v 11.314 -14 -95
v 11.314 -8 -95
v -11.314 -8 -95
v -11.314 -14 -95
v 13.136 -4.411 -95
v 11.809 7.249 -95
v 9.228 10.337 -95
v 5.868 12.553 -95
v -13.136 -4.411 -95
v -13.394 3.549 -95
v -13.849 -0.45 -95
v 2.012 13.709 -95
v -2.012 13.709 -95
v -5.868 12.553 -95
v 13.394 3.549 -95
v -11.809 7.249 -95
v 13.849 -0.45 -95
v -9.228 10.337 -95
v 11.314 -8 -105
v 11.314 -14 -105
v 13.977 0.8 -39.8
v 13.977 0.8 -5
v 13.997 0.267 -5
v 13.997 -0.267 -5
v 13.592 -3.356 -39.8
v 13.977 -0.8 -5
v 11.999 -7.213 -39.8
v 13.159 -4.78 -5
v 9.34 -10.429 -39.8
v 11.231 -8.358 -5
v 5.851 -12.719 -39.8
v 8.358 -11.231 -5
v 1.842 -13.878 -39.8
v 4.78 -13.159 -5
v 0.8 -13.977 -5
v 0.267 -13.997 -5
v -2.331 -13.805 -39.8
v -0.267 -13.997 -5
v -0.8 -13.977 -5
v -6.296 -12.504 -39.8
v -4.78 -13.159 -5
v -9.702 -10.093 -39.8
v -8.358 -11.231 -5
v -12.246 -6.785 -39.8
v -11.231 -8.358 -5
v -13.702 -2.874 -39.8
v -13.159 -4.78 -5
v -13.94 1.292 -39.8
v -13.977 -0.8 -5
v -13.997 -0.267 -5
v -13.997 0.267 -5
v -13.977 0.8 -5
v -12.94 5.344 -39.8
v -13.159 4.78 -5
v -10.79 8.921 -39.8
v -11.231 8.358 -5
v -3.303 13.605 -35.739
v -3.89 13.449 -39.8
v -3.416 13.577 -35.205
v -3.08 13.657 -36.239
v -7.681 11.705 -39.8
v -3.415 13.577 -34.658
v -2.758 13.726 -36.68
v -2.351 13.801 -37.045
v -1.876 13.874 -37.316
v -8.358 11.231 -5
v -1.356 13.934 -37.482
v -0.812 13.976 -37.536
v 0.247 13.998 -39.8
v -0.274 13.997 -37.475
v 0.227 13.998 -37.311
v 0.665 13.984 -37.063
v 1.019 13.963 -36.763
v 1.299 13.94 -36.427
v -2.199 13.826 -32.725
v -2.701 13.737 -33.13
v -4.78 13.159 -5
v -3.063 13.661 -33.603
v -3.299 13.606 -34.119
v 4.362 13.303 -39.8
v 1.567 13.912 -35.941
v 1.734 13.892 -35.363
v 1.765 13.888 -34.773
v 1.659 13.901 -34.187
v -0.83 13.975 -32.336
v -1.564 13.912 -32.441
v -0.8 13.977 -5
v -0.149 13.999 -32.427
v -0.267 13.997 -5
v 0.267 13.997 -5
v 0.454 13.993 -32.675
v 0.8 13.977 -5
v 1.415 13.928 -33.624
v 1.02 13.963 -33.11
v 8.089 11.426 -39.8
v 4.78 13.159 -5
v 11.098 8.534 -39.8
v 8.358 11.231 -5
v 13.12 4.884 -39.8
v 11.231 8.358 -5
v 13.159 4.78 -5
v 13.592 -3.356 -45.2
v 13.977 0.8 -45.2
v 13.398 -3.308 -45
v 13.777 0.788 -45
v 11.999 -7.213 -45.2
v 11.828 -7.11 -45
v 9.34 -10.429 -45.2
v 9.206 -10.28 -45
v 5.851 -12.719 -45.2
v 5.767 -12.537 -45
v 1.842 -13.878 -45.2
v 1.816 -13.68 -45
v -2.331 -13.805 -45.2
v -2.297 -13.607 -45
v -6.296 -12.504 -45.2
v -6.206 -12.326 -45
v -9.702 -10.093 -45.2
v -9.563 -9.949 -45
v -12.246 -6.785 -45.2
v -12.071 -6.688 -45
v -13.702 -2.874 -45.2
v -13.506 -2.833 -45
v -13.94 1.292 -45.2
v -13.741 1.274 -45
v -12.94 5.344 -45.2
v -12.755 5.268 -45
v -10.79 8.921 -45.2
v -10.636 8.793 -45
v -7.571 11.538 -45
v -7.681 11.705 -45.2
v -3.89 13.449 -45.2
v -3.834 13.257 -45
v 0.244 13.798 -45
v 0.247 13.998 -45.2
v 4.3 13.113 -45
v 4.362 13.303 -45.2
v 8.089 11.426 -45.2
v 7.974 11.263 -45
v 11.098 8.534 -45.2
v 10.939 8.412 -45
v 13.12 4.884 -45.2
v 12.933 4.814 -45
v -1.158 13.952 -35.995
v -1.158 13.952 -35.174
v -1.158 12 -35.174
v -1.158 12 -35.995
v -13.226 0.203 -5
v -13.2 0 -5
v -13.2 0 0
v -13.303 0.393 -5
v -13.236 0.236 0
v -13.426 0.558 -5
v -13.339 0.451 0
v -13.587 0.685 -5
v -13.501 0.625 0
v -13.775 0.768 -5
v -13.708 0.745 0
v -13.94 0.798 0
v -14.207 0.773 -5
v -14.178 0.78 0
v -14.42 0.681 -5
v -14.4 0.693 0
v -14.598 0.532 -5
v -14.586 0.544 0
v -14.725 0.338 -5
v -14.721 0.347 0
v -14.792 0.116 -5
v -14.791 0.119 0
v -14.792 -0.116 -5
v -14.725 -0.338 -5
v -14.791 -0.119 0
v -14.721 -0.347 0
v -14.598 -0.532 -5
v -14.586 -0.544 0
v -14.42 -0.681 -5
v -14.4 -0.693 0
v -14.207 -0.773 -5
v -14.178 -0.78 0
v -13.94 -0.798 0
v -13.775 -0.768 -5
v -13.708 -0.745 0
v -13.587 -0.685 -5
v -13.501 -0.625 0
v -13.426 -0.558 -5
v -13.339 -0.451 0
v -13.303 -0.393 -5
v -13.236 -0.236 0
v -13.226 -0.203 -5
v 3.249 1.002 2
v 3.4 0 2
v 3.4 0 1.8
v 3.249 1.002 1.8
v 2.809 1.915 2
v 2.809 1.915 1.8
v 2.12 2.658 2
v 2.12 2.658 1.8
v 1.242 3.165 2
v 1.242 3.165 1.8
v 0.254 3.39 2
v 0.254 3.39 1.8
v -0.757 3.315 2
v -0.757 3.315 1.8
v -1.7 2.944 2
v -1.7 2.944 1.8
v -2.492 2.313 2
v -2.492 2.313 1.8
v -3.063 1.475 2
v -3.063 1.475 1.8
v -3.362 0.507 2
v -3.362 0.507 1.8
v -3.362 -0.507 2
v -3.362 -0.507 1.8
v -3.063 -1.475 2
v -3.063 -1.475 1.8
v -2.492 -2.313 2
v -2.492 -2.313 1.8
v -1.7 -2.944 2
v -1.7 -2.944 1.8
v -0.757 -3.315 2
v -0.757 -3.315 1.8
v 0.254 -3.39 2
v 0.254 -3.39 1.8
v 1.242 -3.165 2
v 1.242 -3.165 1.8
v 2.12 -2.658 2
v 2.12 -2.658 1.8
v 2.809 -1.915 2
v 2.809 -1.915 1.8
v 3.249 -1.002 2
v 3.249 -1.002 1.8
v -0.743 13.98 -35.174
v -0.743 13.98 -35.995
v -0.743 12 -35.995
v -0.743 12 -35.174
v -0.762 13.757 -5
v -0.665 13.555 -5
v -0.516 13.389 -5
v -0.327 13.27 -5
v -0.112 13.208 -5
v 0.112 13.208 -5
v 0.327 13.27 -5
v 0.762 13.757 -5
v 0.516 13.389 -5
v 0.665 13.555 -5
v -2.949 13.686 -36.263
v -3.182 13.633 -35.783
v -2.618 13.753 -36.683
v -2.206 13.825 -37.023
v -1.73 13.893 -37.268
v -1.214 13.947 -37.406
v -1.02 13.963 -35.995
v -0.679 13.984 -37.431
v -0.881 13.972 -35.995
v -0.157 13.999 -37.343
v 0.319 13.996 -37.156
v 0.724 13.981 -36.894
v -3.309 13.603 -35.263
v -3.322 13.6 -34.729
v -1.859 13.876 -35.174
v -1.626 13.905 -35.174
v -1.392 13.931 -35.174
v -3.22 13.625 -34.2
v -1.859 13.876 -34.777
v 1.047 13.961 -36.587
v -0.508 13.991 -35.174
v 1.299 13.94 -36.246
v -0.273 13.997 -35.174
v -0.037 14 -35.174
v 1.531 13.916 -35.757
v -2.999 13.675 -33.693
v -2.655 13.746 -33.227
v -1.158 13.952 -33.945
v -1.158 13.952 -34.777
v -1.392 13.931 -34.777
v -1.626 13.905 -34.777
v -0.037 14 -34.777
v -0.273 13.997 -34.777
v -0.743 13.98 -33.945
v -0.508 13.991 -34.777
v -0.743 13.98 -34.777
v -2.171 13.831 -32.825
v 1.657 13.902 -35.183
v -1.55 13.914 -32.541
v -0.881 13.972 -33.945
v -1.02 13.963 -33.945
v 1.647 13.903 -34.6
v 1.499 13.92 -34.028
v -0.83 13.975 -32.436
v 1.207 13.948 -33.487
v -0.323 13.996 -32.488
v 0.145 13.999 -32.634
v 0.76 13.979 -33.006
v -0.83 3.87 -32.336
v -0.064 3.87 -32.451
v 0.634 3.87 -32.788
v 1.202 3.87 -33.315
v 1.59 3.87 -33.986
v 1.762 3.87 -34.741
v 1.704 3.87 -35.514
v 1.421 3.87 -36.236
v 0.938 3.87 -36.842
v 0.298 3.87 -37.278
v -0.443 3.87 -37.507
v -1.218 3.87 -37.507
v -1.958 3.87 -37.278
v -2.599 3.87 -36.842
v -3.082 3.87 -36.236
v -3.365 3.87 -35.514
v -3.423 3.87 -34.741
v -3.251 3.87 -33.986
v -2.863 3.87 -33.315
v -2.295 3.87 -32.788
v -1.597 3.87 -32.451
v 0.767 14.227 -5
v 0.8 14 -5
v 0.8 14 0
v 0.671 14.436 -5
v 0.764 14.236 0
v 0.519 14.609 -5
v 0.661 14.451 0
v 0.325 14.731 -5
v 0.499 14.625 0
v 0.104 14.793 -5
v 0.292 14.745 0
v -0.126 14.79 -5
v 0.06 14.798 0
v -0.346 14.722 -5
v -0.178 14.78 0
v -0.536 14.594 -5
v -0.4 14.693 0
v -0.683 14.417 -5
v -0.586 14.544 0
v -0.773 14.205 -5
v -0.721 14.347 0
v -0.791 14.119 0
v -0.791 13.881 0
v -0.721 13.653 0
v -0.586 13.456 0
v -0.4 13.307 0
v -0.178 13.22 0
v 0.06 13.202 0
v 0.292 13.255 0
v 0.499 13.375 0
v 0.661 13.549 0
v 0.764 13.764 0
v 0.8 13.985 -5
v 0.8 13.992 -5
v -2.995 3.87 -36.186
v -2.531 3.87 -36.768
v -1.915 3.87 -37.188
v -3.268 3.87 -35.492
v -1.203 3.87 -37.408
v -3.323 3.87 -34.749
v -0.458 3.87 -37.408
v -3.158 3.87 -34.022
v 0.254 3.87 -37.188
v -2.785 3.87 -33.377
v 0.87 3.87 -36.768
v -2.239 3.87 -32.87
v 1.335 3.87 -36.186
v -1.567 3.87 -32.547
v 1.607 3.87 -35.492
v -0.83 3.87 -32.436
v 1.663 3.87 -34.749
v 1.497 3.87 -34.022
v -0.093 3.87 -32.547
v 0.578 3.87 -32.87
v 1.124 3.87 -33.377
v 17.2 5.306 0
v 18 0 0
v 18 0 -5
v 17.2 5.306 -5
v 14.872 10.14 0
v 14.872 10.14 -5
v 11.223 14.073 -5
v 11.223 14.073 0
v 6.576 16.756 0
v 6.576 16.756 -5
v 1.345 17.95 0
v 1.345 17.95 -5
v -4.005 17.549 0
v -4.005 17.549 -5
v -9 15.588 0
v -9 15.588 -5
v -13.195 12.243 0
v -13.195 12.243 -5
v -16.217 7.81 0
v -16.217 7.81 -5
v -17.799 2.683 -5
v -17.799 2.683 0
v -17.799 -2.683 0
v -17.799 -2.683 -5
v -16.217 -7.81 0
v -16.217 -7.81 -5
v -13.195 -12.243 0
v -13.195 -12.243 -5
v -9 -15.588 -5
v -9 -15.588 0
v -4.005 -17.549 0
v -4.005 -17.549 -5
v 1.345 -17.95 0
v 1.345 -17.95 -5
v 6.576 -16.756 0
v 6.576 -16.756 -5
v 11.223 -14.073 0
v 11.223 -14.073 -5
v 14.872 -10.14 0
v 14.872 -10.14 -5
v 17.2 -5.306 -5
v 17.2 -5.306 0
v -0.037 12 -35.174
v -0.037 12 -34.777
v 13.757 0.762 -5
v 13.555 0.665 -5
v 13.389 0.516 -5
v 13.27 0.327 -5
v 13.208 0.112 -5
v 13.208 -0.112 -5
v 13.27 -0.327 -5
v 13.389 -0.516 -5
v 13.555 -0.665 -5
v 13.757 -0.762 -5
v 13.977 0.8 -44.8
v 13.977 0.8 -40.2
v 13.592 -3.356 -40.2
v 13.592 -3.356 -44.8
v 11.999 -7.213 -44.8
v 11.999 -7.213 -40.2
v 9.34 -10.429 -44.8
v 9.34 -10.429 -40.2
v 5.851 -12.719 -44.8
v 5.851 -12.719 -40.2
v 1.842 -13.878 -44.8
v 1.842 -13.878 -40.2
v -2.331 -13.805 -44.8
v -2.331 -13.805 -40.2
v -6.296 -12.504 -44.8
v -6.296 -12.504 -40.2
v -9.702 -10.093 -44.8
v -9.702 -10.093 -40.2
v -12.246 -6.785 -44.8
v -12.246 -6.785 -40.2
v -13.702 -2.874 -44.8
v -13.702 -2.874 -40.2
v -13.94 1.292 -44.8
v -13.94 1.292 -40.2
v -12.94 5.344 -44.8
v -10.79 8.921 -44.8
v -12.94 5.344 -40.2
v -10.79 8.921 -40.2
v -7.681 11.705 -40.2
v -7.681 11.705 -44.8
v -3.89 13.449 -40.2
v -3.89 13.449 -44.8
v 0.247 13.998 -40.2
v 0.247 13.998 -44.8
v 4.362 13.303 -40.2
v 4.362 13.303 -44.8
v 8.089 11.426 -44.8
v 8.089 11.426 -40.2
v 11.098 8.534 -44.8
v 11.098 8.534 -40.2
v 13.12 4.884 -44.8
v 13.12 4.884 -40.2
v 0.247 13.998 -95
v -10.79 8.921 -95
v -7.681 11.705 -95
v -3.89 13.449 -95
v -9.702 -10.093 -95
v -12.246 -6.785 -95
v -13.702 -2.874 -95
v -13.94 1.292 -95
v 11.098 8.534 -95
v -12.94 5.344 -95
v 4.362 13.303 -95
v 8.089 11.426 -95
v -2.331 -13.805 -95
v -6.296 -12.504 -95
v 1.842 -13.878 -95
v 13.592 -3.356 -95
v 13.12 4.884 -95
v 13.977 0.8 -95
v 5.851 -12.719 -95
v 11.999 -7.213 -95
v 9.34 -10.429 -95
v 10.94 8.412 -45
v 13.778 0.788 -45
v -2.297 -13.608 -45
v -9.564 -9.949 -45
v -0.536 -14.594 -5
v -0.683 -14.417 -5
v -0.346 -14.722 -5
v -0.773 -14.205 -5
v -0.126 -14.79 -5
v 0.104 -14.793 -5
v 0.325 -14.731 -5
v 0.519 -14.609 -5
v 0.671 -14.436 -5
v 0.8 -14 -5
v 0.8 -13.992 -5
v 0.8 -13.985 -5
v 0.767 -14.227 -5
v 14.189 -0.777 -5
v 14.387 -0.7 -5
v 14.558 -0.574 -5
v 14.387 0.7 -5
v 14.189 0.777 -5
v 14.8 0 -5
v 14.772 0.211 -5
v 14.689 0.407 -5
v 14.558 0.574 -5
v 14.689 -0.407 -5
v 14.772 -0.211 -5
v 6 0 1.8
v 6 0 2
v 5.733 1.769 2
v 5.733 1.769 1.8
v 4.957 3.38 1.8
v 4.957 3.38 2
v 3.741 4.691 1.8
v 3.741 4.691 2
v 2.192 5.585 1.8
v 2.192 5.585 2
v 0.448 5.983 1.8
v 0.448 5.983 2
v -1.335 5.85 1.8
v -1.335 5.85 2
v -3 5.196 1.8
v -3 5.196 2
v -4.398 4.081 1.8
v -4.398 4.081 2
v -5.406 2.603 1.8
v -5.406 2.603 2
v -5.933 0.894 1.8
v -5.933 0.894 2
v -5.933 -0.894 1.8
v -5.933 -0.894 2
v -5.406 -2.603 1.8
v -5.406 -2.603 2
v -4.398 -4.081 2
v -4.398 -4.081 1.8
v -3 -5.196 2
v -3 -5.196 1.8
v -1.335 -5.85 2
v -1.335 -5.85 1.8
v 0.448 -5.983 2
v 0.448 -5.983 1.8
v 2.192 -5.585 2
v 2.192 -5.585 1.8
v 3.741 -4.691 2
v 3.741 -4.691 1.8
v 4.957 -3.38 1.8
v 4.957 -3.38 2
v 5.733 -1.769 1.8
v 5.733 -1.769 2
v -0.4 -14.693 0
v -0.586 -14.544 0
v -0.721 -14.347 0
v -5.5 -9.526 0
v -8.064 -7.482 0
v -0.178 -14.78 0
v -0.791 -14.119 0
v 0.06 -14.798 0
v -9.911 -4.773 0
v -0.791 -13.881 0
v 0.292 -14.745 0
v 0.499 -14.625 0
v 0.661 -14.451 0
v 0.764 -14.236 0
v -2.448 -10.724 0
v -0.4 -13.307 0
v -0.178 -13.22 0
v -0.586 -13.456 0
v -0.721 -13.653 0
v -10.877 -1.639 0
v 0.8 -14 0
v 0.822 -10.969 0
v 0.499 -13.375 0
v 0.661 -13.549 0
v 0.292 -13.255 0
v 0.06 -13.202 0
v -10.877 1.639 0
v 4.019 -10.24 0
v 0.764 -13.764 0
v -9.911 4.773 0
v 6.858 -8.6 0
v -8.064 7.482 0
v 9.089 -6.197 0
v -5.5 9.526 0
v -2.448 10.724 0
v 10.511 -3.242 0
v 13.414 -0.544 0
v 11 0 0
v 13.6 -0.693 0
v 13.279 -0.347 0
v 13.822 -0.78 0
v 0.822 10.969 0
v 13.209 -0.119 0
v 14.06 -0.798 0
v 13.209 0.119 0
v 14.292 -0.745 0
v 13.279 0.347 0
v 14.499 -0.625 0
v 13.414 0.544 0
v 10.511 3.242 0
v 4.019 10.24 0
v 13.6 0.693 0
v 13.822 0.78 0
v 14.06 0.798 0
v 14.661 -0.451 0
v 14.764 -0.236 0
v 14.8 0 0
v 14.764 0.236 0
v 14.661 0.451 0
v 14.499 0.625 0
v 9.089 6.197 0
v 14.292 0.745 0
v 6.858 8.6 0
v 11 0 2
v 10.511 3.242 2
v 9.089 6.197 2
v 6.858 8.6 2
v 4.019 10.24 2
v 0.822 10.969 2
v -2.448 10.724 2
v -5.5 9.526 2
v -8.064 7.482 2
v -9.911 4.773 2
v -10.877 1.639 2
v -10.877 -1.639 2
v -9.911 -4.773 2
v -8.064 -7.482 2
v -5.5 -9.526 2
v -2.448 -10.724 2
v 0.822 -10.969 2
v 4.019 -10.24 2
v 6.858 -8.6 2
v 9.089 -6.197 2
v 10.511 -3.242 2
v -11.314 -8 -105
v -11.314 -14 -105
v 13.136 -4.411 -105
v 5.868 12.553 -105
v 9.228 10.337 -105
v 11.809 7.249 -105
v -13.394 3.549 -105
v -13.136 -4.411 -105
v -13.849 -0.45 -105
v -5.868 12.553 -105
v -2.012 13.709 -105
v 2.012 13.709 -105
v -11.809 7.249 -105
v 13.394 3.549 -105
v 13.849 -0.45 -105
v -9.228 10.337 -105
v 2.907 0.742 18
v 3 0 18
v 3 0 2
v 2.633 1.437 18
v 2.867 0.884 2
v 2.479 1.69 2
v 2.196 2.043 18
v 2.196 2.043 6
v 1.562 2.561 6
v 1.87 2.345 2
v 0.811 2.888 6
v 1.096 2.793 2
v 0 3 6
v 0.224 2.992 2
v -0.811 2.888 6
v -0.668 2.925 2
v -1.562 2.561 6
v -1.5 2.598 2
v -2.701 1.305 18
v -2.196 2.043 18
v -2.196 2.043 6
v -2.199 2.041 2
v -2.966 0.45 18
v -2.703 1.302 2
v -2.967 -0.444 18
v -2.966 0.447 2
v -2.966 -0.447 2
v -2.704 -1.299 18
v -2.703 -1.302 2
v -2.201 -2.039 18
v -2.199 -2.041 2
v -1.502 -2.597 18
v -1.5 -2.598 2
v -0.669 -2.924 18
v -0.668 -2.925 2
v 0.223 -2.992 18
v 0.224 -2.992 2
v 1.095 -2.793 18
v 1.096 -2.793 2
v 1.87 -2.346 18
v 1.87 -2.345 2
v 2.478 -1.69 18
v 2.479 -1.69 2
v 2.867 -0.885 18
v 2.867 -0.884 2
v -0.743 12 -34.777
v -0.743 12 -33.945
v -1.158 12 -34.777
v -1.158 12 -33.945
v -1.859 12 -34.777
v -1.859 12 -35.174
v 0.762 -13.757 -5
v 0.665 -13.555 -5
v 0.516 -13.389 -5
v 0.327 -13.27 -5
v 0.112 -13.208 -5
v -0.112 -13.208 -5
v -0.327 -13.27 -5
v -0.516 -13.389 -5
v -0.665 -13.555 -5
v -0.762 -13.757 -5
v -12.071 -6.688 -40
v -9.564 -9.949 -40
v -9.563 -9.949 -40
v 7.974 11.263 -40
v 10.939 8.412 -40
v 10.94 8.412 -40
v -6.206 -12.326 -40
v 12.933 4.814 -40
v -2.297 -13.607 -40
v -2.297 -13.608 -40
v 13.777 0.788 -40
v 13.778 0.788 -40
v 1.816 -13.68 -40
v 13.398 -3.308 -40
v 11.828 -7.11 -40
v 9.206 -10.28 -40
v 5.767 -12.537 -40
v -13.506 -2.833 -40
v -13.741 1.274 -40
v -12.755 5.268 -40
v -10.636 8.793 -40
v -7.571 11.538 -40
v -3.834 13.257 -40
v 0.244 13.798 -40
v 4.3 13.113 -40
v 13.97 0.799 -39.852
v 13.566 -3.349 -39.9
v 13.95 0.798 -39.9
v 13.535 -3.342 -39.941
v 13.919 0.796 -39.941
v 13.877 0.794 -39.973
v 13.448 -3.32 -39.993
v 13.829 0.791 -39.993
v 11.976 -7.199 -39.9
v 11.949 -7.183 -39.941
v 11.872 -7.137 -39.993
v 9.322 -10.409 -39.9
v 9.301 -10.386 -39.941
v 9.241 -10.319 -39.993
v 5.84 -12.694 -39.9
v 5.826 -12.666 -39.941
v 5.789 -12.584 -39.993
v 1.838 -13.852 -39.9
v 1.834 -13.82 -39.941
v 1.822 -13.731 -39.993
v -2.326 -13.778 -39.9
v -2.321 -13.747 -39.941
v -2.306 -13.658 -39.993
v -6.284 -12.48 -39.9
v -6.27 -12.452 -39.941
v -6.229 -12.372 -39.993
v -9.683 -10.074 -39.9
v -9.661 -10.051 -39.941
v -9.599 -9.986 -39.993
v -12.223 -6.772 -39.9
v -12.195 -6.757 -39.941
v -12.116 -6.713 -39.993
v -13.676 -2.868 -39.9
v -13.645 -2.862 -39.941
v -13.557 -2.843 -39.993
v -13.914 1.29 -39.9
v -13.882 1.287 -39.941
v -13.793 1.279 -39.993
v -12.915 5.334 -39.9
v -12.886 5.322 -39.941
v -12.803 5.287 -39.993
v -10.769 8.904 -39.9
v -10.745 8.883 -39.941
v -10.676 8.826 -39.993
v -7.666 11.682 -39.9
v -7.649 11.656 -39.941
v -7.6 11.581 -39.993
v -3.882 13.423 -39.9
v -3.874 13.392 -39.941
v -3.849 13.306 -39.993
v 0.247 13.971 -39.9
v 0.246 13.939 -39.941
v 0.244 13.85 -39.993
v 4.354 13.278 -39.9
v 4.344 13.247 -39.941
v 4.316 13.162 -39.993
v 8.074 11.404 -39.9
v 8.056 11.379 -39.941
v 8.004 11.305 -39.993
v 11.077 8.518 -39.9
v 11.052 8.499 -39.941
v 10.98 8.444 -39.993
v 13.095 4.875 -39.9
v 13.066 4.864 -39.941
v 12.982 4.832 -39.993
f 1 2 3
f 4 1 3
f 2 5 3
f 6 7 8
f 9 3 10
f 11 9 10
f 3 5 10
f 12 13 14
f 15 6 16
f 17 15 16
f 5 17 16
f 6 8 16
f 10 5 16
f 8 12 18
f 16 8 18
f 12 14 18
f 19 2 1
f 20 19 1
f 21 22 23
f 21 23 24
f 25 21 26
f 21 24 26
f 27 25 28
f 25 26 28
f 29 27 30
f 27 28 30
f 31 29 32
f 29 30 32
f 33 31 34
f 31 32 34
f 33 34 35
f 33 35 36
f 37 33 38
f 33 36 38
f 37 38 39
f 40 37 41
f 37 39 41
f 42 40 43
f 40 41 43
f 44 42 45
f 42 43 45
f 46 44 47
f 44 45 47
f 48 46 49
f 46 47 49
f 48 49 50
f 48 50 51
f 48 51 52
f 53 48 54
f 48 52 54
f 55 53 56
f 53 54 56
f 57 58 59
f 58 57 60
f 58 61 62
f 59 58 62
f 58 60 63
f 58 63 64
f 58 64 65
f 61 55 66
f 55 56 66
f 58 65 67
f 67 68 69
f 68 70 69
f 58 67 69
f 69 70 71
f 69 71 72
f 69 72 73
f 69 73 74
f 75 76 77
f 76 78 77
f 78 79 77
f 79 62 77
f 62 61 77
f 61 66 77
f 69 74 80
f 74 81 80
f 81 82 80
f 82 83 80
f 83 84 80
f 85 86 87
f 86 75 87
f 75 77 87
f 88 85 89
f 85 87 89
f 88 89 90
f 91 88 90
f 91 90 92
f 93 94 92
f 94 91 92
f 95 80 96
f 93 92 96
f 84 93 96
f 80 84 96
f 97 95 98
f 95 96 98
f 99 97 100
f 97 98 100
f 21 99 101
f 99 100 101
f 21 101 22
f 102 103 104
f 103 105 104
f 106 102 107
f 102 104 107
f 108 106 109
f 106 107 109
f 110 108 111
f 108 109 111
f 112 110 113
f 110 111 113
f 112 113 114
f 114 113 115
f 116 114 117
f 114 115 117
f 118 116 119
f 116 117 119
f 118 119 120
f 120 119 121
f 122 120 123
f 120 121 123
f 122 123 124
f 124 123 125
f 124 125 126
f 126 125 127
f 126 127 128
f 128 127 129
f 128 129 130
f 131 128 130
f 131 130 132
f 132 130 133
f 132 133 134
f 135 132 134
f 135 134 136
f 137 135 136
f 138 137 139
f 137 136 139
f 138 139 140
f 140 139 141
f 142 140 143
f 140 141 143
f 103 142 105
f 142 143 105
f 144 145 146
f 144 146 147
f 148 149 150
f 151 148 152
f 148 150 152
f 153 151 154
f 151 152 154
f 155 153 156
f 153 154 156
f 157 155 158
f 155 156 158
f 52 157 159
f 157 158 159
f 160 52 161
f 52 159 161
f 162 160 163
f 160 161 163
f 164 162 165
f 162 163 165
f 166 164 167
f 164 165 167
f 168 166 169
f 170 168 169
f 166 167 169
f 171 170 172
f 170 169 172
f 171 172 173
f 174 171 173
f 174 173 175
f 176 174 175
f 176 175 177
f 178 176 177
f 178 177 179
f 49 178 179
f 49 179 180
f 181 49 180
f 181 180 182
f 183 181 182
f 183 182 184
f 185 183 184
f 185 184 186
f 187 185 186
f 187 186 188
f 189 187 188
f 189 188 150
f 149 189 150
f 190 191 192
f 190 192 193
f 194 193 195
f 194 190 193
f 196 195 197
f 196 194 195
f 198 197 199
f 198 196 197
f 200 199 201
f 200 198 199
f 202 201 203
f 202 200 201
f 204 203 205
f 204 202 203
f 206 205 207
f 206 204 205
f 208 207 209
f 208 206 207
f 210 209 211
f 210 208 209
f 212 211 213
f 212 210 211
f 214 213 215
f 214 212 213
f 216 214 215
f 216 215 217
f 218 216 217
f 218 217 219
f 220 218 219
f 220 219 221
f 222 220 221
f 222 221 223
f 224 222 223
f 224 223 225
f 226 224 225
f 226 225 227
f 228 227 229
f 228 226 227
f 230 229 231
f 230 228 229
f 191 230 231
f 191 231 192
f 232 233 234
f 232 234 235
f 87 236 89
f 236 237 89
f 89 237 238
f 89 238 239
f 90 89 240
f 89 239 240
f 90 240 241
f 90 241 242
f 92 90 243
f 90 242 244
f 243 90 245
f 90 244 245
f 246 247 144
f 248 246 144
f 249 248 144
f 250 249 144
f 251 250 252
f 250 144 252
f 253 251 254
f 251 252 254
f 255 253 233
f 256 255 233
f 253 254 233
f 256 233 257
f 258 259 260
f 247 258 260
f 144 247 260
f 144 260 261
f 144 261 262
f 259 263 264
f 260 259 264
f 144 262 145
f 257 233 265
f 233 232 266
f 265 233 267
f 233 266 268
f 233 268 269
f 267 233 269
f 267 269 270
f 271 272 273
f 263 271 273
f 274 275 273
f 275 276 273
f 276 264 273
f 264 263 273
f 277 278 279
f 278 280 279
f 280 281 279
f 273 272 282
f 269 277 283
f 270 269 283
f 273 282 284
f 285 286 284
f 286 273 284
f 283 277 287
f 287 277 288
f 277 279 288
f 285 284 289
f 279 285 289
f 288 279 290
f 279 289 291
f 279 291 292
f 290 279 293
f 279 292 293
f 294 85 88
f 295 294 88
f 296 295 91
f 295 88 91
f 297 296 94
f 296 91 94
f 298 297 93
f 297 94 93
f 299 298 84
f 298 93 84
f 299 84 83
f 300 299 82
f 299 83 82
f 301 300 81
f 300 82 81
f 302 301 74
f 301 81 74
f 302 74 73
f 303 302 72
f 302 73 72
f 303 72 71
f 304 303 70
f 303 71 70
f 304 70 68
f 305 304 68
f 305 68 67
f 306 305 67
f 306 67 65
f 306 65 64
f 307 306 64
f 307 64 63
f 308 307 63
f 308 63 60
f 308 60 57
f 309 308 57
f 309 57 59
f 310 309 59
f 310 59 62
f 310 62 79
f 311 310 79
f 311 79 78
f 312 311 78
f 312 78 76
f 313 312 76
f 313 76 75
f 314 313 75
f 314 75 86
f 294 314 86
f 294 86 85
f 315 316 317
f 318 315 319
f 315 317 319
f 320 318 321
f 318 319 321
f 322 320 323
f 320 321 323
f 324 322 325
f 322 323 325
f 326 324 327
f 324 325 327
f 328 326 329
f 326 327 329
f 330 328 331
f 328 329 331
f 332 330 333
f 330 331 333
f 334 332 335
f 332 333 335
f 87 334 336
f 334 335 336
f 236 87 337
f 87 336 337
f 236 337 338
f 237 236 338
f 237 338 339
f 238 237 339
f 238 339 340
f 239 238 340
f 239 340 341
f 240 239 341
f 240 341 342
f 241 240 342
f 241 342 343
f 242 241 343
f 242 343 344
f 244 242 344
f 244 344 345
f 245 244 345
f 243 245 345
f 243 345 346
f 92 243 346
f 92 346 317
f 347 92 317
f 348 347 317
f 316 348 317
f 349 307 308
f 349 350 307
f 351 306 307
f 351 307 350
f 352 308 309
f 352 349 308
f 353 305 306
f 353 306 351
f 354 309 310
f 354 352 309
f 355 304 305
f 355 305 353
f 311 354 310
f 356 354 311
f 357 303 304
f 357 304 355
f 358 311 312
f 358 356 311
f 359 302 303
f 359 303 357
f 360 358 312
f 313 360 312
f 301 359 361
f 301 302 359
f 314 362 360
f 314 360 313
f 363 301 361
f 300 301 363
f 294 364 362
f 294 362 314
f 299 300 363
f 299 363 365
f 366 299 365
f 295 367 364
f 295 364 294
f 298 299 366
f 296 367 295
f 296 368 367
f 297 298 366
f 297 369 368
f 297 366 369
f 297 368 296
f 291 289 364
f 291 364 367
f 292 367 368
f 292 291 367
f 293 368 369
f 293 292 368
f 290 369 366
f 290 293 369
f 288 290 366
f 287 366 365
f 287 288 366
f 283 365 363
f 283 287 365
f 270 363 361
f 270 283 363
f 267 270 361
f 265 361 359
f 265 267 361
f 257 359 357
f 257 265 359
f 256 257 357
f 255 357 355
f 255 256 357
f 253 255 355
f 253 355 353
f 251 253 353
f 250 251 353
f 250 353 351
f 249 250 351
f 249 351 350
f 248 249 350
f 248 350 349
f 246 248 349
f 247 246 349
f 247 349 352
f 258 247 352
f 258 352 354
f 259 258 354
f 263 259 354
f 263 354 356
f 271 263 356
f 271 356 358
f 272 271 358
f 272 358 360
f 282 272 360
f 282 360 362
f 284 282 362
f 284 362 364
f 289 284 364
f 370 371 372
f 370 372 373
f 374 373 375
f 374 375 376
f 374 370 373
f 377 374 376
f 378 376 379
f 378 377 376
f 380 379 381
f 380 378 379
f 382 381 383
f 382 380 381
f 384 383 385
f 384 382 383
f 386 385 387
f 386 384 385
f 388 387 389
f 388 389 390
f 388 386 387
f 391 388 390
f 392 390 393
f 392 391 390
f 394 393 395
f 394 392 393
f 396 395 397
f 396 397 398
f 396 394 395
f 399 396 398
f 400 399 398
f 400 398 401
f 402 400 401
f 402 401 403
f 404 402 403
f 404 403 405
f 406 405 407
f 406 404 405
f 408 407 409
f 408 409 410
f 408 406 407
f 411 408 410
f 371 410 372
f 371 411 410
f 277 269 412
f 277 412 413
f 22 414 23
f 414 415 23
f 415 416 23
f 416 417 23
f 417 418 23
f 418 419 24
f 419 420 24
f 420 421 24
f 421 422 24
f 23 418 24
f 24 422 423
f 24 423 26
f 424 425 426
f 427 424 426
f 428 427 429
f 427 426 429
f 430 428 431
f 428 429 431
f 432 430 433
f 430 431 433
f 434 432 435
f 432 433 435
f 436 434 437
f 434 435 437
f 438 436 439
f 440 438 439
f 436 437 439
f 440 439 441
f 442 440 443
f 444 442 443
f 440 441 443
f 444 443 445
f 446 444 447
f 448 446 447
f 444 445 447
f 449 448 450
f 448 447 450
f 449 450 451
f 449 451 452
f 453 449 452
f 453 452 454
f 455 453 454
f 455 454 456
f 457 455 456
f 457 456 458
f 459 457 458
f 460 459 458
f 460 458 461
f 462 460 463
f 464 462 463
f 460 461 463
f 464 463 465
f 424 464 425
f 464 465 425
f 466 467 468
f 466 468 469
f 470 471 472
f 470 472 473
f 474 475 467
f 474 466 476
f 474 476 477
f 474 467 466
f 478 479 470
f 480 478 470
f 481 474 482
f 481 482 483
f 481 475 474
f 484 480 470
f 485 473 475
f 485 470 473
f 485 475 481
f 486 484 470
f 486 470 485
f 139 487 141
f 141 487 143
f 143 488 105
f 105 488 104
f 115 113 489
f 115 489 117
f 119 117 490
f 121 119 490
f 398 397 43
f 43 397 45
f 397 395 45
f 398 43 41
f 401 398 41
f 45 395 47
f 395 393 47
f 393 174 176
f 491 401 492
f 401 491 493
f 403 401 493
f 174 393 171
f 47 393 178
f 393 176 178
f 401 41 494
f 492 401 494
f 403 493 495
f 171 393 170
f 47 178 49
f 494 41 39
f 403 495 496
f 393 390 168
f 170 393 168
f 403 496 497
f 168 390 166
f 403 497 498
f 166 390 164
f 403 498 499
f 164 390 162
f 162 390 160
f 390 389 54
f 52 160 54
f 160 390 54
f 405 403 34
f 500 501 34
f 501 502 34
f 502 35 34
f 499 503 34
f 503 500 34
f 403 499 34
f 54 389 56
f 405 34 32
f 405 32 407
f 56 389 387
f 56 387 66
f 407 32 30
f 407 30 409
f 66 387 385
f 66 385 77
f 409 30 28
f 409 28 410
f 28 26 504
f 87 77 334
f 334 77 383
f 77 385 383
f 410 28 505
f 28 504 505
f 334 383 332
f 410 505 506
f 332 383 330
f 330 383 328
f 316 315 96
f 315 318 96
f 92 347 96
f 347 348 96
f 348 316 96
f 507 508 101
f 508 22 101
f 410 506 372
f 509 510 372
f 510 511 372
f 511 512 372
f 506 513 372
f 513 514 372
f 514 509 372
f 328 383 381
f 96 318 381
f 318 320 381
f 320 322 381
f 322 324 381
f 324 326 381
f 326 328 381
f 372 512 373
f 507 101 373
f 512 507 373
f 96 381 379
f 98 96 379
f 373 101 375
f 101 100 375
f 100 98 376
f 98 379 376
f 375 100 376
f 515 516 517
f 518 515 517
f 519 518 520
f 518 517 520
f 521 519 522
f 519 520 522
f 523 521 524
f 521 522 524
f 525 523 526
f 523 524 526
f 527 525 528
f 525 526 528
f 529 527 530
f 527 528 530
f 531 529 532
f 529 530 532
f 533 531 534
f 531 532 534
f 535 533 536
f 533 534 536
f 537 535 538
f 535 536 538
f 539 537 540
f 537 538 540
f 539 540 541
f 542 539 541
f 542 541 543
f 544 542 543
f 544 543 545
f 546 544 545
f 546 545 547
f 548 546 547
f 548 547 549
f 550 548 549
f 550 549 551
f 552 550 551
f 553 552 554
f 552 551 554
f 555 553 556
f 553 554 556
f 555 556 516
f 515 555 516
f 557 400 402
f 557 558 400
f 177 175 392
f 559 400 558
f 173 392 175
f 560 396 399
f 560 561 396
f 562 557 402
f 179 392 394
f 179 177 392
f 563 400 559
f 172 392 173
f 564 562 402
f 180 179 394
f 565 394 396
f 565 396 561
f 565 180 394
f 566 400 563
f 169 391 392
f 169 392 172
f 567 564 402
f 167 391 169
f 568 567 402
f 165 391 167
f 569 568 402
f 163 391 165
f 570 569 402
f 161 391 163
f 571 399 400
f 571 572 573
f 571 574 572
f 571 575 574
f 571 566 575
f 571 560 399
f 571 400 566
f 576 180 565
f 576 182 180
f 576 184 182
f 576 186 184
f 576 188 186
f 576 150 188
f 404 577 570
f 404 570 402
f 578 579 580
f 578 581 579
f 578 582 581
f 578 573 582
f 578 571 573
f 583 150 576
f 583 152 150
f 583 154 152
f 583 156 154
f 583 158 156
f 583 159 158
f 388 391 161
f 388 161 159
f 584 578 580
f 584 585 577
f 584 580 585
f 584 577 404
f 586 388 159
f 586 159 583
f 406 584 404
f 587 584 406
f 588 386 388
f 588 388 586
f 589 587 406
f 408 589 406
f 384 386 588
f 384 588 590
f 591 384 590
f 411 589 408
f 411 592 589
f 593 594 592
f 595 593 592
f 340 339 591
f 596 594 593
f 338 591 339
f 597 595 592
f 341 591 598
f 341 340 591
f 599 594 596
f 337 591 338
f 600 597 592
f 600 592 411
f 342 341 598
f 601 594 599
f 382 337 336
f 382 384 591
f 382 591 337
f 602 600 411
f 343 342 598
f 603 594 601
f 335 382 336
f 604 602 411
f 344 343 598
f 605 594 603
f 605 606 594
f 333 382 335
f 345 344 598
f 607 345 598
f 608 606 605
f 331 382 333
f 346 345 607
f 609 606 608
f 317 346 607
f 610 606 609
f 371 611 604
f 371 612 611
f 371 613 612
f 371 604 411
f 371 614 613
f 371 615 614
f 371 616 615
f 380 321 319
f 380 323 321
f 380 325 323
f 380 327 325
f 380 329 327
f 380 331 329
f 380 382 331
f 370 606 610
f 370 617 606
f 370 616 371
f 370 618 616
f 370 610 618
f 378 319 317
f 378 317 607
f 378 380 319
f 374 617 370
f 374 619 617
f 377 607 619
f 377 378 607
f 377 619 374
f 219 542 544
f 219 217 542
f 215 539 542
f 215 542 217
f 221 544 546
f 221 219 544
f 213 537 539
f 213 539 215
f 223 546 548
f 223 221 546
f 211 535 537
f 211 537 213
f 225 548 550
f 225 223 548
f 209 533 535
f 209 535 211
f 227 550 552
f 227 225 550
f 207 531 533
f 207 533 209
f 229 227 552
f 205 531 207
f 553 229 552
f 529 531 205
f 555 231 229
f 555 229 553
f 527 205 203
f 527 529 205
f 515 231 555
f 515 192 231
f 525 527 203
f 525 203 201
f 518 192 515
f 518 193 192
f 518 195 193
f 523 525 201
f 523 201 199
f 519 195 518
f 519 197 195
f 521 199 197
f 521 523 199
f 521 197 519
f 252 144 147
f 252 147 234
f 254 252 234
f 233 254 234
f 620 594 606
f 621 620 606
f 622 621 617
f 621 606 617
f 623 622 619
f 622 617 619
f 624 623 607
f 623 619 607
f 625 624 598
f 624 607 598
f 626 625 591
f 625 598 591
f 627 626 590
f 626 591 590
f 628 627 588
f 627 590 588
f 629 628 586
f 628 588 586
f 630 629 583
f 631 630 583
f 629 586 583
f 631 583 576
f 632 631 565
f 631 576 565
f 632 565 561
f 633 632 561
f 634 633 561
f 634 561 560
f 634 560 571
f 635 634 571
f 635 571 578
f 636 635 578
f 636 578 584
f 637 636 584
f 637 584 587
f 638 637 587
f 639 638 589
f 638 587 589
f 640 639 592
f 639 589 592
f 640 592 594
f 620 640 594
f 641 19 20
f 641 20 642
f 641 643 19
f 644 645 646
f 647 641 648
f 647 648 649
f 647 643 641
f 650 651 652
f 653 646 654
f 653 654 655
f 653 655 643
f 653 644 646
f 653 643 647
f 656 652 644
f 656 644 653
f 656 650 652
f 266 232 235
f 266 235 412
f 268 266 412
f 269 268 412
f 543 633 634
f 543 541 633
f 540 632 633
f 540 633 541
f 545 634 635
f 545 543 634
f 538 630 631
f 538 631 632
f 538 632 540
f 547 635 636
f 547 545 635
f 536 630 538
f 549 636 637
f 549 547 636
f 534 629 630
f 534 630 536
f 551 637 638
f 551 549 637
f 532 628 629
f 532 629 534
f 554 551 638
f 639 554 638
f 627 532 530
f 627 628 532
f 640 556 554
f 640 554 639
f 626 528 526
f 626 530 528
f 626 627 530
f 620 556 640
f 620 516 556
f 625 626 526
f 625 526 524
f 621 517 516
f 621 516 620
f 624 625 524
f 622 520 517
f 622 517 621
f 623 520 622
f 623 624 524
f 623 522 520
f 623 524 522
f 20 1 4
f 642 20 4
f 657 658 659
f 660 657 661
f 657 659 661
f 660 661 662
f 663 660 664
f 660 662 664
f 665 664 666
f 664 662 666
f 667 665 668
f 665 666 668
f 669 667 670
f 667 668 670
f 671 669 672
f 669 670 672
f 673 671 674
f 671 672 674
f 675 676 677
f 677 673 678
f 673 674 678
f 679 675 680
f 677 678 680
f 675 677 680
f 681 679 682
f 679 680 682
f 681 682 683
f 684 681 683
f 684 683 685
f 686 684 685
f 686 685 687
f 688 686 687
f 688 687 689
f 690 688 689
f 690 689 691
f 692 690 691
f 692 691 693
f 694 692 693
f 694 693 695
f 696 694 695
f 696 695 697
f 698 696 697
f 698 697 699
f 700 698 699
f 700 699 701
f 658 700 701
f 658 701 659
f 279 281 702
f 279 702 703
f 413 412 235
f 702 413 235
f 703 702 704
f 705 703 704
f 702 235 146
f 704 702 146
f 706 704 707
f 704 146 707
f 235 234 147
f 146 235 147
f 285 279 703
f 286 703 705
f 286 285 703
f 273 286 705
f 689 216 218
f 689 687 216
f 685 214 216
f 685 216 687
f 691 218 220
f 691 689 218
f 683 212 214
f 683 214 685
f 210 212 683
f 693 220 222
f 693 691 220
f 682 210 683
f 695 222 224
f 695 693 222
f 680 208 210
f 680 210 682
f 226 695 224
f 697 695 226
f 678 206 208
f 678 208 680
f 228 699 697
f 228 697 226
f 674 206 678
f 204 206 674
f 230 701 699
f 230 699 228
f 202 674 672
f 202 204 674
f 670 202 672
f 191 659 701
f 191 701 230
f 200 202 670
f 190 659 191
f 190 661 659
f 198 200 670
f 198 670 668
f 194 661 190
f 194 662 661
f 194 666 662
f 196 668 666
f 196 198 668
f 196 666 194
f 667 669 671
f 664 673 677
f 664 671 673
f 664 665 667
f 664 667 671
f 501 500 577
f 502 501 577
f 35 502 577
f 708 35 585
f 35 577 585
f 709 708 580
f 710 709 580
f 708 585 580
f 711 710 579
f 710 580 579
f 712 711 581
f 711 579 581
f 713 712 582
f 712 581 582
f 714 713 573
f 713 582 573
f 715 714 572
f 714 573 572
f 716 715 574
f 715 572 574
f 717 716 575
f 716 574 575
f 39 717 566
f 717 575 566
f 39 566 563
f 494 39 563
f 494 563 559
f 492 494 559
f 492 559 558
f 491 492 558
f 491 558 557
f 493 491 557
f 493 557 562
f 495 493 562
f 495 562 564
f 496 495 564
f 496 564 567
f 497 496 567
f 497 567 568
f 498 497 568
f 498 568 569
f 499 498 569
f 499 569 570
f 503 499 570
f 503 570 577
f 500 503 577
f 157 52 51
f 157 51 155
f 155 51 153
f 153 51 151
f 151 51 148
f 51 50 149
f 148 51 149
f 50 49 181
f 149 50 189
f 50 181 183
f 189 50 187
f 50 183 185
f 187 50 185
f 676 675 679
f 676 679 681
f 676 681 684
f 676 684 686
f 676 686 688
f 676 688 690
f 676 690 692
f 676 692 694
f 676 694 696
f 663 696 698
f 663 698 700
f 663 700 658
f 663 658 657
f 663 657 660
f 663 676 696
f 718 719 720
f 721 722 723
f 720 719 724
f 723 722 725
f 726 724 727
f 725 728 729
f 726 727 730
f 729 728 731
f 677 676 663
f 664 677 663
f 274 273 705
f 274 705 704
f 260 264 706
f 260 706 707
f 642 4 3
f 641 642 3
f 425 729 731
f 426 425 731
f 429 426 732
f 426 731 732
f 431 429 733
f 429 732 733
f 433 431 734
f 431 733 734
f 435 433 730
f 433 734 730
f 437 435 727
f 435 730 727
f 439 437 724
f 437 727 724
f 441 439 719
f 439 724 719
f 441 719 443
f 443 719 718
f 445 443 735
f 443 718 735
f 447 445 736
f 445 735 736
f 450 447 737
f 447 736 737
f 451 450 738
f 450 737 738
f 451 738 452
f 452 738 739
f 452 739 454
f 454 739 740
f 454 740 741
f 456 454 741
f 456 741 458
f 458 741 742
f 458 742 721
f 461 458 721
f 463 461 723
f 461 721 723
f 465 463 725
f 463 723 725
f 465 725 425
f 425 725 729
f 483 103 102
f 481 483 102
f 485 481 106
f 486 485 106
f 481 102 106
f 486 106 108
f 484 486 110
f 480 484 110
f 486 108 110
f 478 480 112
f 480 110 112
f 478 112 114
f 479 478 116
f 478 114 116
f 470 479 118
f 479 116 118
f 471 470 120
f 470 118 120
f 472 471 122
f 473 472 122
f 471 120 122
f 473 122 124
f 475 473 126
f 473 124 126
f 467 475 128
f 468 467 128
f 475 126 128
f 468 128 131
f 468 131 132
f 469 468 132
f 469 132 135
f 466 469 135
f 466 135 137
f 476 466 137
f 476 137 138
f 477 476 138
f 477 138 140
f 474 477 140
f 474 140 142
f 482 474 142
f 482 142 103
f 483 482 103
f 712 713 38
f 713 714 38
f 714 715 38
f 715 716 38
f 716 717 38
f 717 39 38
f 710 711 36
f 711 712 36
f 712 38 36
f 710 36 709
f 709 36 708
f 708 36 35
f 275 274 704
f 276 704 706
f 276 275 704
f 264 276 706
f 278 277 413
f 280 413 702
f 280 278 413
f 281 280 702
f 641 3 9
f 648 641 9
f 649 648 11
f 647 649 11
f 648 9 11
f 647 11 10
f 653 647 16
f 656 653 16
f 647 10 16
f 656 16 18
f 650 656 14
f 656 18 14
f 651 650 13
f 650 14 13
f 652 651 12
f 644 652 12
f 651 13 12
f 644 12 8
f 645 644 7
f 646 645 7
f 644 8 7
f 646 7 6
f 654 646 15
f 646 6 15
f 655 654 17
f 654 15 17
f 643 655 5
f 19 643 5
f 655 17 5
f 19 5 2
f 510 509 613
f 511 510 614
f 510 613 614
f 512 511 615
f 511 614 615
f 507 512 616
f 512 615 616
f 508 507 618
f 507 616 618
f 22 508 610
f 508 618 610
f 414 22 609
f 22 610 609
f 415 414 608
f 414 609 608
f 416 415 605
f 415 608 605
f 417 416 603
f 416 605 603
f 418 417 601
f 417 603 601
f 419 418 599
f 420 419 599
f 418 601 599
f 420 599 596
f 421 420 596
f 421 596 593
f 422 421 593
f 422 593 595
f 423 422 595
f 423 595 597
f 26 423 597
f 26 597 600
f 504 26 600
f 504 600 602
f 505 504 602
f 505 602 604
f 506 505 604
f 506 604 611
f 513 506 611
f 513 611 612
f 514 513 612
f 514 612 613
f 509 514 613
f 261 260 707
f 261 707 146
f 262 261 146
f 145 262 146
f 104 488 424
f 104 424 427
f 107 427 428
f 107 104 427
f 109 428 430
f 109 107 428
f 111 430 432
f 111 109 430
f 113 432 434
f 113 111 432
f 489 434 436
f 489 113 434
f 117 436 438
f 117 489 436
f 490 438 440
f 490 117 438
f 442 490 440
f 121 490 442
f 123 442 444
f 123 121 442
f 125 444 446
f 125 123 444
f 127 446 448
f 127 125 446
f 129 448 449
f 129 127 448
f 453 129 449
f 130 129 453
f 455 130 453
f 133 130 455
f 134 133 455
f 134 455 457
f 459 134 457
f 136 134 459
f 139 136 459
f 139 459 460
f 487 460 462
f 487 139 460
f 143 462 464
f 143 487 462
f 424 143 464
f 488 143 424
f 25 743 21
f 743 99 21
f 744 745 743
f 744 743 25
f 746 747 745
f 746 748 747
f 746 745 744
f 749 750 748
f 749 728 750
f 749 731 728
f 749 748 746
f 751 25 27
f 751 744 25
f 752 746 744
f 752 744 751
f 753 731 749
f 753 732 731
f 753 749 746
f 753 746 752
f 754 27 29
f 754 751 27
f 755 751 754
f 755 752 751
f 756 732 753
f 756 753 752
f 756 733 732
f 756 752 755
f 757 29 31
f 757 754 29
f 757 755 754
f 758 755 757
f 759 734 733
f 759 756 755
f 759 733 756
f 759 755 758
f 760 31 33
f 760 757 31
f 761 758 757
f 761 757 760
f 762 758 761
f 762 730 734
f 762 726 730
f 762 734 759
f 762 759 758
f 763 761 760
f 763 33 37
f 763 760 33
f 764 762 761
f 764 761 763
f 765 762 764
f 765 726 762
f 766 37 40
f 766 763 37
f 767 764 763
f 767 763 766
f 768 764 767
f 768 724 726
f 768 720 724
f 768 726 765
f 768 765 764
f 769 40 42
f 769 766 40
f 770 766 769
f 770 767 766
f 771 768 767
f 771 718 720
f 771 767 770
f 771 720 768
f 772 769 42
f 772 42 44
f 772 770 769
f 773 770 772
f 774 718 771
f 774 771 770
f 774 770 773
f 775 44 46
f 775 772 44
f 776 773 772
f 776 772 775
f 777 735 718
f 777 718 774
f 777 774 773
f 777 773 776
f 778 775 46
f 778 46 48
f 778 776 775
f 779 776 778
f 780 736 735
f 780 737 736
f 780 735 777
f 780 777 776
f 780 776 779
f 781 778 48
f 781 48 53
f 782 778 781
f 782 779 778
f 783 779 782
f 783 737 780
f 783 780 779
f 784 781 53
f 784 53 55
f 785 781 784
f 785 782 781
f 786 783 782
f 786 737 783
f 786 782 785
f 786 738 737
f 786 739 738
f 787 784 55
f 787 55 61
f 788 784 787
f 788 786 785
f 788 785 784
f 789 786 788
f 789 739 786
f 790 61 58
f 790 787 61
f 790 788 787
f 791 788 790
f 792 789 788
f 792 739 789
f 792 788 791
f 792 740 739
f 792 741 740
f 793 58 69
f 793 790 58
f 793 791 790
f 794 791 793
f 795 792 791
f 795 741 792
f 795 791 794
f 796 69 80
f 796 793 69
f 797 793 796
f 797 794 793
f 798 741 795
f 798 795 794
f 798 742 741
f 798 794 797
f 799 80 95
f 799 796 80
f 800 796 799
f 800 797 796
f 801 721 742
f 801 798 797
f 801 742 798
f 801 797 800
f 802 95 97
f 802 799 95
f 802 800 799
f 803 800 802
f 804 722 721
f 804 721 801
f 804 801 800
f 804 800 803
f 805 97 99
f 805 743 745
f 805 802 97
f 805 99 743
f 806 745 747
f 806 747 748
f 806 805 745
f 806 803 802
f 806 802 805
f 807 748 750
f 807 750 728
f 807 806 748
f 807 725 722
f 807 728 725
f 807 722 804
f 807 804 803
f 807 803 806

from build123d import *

# Parameters (mm, degrees)
SKETCH1_R                   = 18
BOSS_EXTRUDE2_DEPTH         = 5
SKETCH1_4_R                 = 11
BOSS_EXTRUDE3_DEPTH         = 2
SKETCH2_R                   = 3
BOSS_EXTRUDE4_DEPTH         = 16
SKETCH3_W                   = 6.362998302
SKETCH3_H                   = 1.749824533
CUT_EXTRUDE1_DEPTH          = 12
SKETCH4_R                   = 6
SKETCH4_R_2                 = 3.4
CUT_EXTRUDE2_DEPTH          = 0.2
TAP_DRILL_FOR_M2X0_4_TAP1_D = 1.6
SKETCH5_R                   = 14
BOSS_EXTRUDE5_DEPTH         = 35
FILLET2_R                   = 0.2
SKETCH7_R                   = 14
BOSS_EXTRUDE6_DEPTH         = 5
CHAMFER1_SIZE               = 0.2
SKETCH10_R                  = 14
BOSS_EXTRUDE7_DEPTH         = 50
CHAMFER2_SIZE               = 0.2
BOSS_EXTRUDE8_DEPTH         = 10
SKETCH12_R                  = 2.6
SKETCH12_R_2                = 2.5
CUT_EXTRUDE3_DEPTH          = 10.13
CUT_EXTRUDE4_DEPTH          = 2


# Some blends are built 0.0001 mm under size
with BuildPart() as part:
    # Sketch1 → Boss-Extrude2 (new body)
    with BuildSketch(Plane.XY):
        Circle(SKETCH1_R)
    extrude(amount=-BOSS_EXTRUDE2_DEPTH)

    # Sketch1<4> → Boss-Extrude3 (add)
    with BuildSketch(Plane.XY):
        Circle(SKETCH1_4_R)
    extrude(amount=BOSS_EXTRUDE3_DEPTH)

    # Sketch2 → Boss-Extrude4 (add)
    with BuildSketch(Plane.XY.offset(2)):
        Circle(SKETCH2_R)
    extrude(amount=BOSS_EXTRUDE4_DEPTH)

    # Sketch3 → Cut-Extrude1 (cut)
    with BuildSketch(Plane.XY.offset(18)):
        with Locations((0.265444357, 2.918366652)):
            Rectangle(SKETCH3_W, SKETCH3_H)
    extrude(amount=-CUT_EXTRUDE1_DEPTH, mode=Mode.SUBTRACT)

    # Sketch4 → Cut-Extrude2 (cut)
    with BuildSketch(Plane.XY.offset(2)):
        Circle(SKETCH4_R)
        Circle(SKETCH4_R_2, mode=Mode.SUBTRACT)
    extrude(amount=-CUT_EXTRUDE2_DEPTH, mode=Mode.SUBTRACT)

    # Tap Drill for M2x0.4 Tap1 (through all)
    with Locations(Plane(origin=(0, 14, -5), x_dir=(-1, 0, 0), z_dir=(0, 0, -1))):
        with Locations((0, 0), (-14, -14), (0, -28), (14, -14)):
            Hole(TAP_DRILL_FOR_M2X0_4_TAP1_D / 2)

    # Sketch5 → Boss-Extrude5 (add)
    with BuildSketch(Plane(origin=(0, 0, -5), x_dir=(-1, 0, 0), z_dir=(0, 0, -1))):
        with Locations(Location((0, 0, 0), (0, 0, 176.725509844))):
            Circle(SKETCH5_R)
    extrude(amount=BOSS_EXTRUDE5_DEPTH)

    # Fillet2
    fillet2_edges = [part.edges().sort_by_distance(p)[0] for p in [
        (-13.977142857, -0.799673403, -40),
    ]]
    fillet(fillet2_edges, radius=FILLET2_R)

    # Sketch7 → Boss-Extrude6 (add)
    with BuildSketch(Plane(origin=(0, 0, -40), x_dir=(-1, 0, 0), z_dir=(0, 0, -1))):
        with Locations(Location((0, 0, 0), (0, 0, 176.725509844))):
            Circle(SKETCH7_R)
    extrude(amount=BOSS_EXTRUDE6_DEPTH)

    # Chamfer1
    chamfer1_edges = [part.edges().sort_by_distance(p)[0] for p in [
        (-13.977142857, -0.799673403, -40),
        (-13.977142857, -0.799673403, -45),
    ]]
    chamfer(chamfer1_edges, length=CHAMFER1_SIZE - 0.0001)  # a hair under: the kernel refuses the full size

    # Sketch10 → Boss-Extrude7 (add)
    with BuildSketch(Plane(origin=(0, 0, -45), x_dir=(-1, 0, 0), z_dir=(0, 0, -1))):
        with Locations(Location((0, 0, 0), (0, 0, 176.725509844))):
            Circle(SKETCH10_R)
    extrude(amount=BOSS_EXTRUDE7_DEPTH)

    # Chamfer2
    # the kernel refuses this chamfer: 0.2 mm, written as the material it takes off along each edge
    with BuildSketch(Plane(origin=(0, 0, -45), x_dir=(0.9983673469383324, 0.057119528773576726, 0), z_dir=(-0.057119528773576726, 0.9983673469383324, 0))) as chamfer2_piece_1:
        Polygon((14, CHAMFER2_SIZE), (14 - CHAMFER2_SIZE, 0), (14, 0), align=None)
    revolve(axis=Axis((0, 0, -45), (0, 0, -1)), mode=Mode.SUBTRACT)

    # Sketch12 → Cut-Extrude3 (cut)
    with BuildSketch(Plane(origin=(0, 14, 0), x_dir=(1, 0, 0), z_dir=(0, 1, 0))):
        with Locations(Location((-0.830324238, 34.935733276, 0), (0, 0, 270))):
            Circle(SKETCH12_R)
        with Locations(Location((-0.830324238, 34.935733276, 0), (0, 0, 270))):
            Circle(SKETCH12_R_2, mode=Mode.SUBTRACT)
    extrude(amount=-CUT_EXTRUDE3_DEPTH, mode=Mode.SUBTRACT)

    # Sketch13 → Cut-Extrude4 (cut)
    with BuildSketch(Plane(origin=(0, 14, 0), x_dir=(1, 0, 0), z_dir=(0, 1, 0))):
        Polygon((-0.743156629, 35.174011268), (-0.037154138, 35.174011268), (-0.037154138, 34.777385043), (-0.743156629, 34.777385043), (-0.743156629, 33.944764058), (-1.157734464, 33.944764058), (-1.157734464, 34.777385043), (-1.858828415, 34.777385043), (-1.858828415, 35.174011268), (-1.157734464, 35.174011268), (-1.157734464, 35.994600549), (-0.743156629, 35.994600549), align=None)
    extrude(amount=-CUT_EXTRUDE4_DEPTH, mode=Mode.SUBTRACT)


with BuildPart() as body_2:
    # Sketch11 → Boss-Extrude8 (new body)
    with BuildSketch(Plane(origin=(0, 0, -95), x_dir=(-1, 0, 0), z_dir=(0, 0, -1))):
        with BuildLine():
            Line((-11.313708499, -8), (-11.313708499, -14))
            Line((-11.313708499, -14), (11.313708499, -14))
            Line((11.313708499, -14), (11.313708499, -8))
            ThreePointArc((11.313708499, -8), (0, 13.856406461), (-11.313708499, -8))
        make_face()
    extrude(amount=BOSS_EXTRUDE8_DEPTH)


solid = Compound([part.part, body_2.part])
